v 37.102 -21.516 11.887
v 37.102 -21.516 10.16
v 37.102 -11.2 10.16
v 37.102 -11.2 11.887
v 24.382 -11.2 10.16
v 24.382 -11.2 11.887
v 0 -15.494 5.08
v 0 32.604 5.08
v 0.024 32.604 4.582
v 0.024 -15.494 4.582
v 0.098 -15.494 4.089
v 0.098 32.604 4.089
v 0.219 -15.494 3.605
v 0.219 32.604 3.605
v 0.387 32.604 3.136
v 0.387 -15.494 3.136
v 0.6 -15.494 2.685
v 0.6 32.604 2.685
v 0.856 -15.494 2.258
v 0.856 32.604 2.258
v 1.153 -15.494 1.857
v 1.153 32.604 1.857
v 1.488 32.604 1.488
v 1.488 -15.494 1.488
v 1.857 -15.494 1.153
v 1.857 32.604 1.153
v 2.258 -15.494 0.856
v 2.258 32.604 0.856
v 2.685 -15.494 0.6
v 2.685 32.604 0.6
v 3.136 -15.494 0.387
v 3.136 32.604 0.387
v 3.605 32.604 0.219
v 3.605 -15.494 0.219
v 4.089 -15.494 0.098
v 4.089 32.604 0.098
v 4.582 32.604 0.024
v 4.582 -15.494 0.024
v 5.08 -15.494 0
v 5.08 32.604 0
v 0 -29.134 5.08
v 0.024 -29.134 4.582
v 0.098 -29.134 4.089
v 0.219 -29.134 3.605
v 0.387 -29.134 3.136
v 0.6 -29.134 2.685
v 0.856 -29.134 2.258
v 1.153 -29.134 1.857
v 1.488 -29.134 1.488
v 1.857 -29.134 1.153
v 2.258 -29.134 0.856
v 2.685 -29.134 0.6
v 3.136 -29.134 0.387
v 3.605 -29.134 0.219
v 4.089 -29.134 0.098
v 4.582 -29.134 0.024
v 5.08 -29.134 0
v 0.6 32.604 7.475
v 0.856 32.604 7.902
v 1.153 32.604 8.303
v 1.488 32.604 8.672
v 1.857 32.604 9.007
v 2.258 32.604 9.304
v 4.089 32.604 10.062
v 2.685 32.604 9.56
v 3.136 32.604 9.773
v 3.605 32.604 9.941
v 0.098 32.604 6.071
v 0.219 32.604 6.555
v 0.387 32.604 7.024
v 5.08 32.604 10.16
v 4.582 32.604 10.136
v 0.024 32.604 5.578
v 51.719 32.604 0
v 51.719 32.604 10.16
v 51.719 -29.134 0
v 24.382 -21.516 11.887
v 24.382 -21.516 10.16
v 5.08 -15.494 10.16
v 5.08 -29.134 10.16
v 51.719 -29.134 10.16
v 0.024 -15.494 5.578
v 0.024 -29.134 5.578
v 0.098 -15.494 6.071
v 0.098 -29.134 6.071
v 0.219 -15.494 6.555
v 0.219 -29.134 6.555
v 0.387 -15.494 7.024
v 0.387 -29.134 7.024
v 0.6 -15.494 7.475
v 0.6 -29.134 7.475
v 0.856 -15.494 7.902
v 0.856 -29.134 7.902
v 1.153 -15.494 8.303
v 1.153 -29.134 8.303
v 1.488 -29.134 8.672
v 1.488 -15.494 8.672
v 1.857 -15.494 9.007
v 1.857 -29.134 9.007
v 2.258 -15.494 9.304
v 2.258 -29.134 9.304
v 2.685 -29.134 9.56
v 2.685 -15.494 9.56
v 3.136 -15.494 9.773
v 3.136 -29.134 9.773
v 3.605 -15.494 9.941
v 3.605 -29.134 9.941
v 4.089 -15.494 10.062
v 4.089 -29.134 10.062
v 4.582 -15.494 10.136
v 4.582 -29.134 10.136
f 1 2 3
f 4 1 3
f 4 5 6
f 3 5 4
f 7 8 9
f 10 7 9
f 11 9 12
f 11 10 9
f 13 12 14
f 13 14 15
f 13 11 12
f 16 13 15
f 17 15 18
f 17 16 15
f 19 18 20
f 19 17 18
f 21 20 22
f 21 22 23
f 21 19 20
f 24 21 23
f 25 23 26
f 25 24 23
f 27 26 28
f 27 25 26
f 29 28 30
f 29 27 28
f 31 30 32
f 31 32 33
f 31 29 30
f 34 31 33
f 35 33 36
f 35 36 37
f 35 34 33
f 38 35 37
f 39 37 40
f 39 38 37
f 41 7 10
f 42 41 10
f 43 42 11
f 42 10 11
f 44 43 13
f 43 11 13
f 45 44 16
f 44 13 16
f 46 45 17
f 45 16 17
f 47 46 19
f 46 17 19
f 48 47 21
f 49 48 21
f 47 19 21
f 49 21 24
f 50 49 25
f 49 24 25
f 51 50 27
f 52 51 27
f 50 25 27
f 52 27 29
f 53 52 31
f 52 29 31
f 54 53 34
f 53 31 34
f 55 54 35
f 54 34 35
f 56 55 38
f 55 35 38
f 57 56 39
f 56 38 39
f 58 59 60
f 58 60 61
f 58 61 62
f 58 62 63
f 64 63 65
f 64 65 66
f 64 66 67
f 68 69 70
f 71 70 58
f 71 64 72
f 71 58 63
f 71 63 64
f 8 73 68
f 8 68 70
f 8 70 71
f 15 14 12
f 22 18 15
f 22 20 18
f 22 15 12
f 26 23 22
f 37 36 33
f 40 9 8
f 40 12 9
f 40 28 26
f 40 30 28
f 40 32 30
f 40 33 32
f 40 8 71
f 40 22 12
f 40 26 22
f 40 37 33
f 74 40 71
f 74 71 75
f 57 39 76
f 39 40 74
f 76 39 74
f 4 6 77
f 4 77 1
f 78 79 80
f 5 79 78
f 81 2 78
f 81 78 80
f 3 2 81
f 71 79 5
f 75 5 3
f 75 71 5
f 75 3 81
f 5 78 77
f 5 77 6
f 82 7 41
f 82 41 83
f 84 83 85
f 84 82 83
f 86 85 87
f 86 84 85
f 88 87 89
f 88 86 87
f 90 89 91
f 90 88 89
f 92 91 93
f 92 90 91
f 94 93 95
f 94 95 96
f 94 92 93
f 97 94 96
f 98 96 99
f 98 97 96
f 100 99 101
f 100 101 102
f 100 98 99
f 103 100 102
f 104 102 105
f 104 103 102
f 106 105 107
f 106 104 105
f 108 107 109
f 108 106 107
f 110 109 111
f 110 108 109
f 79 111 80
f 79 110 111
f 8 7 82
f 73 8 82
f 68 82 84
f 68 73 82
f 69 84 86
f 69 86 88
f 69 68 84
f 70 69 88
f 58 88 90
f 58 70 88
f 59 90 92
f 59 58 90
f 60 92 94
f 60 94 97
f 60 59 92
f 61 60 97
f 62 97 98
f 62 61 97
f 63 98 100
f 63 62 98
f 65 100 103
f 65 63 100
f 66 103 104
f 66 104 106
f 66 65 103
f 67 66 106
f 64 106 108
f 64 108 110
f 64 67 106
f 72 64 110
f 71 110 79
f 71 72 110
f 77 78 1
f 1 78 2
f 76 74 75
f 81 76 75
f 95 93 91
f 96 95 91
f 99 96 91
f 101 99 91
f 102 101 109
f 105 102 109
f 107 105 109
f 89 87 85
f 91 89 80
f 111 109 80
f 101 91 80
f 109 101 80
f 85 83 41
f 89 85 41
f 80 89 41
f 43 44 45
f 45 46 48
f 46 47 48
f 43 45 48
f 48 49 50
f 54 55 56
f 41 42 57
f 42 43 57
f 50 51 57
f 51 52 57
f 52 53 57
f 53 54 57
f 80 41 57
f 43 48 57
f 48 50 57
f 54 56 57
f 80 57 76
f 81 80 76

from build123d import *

# Parameters (mm, degrees)
F0_W     = 51.7186559737
F0_H     = 32.6044745743
F1_DEPTH = 10.16
F2_DEPTH = 15.494
F4_R     = 5.08
F5_R     = 5.07999
F6_DEPTH = 13.6398
F7_W     = 12.719899416
F7_H     = 10.316294618
F8_DEPTH = 1.7272


# Not quite as in the source:
# - a fillet or chamfer is up to 0.001 mm smaller than in the source, because OpenCascade refuses the exact size


with BuildPart() as f1:
    # F0 (on Top) → F1 (new body)
    with BuildSketch(Plane.XY):
        with Locations((25.8593279868, 16.3022372872)):
            Rectangle(F0_W, F0_H)
    extrude(amount=F1_DEPTH)

    # F2 (add): a face of the model
    f2_faces = [f1.faces().sort_by_distance(p)[0] for p in [
        (25.8593279868, 0, 5.08),
    ]]
    extrude(f2_faces, amount=F2_DEPTH)

    # F4
    f4_edges = [f1.edges().sort_by_distance(p)[0] for p in [
        (0, 8.555237, 10.16),
    ]]
    fillet(f4_edges, radius=F4_R)

    # F5 (radius 5.08 in the source; OpenCascade refuses exactly that, so slightly less here)
    f5_edges = [f1.edges().sort_by_distance(p)[0] for p in [
        (0, 8.555237, 0),
    ]]
    fillet(f5_edges, radius=F5_R)

    # F6 (add): a face of the model
    f6_faces = [f1.faces().sort_by_distance(p)[0] for p in [
        (26.3917193742, -15.494, 5.0799998568),
    ]]
    extrude(f6_faces, amount=F6_DEPTH)

    # F7 (on face) → F8 (join)
    with BuildSketch(Plane.XY.offset(10.16)):
        with Locations((30.7424403727, -16.3579261862)):
            Rectangle(F7_W, F7_H)
    extrude(amount=F8_DEPTH)


solid = f1.part
